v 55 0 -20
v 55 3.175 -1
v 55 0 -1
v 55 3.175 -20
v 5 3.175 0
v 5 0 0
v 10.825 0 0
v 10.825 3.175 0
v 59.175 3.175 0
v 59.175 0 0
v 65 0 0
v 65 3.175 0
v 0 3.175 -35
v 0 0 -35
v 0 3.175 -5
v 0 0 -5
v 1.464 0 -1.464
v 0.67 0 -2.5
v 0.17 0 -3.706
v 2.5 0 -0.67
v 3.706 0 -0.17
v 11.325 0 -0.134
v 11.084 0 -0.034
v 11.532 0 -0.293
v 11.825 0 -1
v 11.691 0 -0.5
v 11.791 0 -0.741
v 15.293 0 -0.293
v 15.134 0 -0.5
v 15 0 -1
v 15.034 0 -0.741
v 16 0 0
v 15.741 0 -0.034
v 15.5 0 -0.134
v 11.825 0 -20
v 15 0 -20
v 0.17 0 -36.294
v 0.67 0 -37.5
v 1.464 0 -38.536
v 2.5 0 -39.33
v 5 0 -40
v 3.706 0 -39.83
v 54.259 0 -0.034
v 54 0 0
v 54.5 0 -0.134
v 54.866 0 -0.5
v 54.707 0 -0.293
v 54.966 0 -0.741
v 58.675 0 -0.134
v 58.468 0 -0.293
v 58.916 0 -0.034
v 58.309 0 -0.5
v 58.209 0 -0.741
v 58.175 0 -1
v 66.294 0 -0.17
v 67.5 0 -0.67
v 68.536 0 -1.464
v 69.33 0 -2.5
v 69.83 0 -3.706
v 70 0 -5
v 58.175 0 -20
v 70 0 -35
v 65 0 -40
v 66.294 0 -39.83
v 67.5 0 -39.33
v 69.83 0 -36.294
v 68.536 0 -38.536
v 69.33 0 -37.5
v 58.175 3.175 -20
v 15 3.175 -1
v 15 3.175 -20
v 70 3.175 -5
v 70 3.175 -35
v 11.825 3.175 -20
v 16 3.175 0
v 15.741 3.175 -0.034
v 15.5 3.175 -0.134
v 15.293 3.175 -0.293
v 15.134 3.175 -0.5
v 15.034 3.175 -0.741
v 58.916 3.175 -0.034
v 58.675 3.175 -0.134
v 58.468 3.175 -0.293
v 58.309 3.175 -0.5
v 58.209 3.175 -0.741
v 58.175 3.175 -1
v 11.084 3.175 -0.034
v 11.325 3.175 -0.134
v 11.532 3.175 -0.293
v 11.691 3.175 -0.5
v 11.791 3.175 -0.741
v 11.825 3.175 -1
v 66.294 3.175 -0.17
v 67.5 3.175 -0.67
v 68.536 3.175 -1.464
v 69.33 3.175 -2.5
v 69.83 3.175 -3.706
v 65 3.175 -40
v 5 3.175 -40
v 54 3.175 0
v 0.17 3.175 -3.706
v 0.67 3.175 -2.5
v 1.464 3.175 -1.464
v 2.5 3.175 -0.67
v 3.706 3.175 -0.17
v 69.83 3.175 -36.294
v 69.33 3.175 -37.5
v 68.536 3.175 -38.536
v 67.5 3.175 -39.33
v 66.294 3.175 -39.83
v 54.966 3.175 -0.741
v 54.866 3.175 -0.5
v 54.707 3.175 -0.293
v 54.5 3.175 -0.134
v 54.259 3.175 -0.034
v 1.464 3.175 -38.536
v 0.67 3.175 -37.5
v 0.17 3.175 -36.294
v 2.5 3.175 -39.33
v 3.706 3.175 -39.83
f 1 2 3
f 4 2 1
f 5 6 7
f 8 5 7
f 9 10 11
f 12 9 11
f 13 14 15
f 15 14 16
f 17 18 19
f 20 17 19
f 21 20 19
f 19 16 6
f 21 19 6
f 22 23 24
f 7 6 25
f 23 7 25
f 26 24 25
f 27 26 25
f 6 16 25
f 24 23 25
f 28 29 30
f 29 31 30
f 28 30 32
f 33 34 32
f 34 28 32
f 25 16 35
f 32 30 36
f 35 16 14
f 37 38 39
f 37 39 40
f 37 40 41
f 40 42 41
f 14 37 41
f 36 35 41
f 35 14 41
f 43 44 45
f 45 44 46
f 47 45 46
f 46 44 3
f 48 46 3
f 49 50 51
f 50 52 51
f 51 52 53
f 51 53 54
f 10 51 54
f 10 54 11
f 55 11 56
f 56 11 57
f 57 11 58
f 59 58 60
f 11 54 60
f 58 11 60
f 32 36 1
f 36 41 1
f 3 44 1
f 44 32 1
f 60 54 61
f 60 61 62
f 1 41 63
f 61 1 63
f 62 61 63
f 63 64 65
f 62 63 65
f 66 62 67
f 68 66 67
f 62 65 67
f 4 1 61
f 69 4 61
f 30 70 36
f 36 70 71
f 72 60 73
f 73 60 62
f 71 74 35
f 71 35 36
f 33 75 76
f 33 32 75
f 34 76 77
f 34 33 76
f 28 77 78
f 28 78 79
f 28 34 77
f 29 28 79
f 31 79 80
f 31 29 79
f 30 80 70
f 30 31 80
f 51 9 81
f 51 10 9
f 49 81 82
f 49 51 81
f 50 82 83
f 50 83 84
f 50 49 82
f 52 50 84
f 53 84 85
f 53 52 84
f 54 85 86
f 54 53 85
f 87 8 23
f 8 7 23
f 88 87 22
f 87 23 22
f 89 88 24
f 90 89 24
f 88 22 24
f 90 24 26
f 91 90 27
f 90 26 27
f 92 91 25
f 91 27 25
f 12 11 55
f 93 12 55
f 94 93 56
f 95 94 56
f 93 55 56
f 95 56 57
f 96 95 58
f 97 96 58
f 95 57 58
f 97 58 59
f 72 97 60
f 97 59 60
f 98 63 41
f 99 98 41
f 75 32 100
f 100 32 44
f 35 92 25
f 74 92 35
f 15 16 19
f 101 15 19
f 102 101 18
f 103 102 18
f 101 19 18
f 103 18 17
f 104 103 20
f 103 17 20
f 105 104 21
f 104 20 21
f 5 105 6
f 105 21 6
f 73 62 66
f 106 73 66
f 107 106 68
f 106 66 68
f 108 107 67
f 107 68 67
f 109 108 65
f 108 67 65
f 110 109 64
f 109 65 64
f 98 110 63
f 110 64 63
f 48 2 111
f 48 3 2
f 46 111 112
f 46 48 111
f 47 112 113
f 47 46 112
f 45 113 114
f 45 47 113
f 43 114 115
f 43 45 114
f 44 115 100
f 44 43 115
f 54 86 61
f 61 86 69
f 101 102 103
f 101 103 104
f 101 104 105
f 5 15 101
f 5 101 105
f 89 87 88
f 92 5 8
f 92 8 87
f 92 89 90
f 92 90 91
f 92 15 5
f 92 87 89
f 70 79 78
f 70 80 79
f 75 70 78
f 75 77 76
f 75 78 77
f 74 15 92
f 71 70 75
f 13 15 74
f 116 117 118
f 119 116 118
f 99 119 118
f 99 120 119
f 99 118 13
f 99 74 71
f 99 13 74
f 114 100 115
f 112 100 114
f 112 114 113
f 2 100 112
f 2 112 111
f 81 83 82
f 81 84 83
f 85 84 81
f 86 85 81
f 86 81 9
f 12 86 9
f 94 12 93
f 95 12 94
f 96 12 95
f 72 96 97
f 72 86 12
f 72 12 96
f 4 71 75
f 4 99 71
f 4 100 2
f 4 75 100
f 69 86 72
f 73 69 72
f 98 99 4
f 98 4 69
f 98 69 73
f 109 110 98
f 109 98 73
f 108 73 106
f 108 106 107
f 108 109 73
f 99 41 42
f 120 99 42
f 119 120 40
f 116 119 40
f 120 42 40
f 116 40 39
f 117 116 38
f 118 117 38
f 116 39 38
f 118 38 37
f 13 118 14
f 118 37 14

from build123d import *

# Parameters (mm, degrees)
BOSS_EXTRUDE1_DEPTH = 3.175
SKETCH2_W           = 3.175
SKETCH2_H           = 20
CUT_EXTRUDE1_DEPTH  = 4.175
FILLET1_R           = 1


with BuildPart() as part:
    # Sketch1 → Boss-Extrude1 (new body)
    with BuildSketch(Plane(origin=(0, 0, 0), x_dir=(1, 0, 0), z_dir=(0, 1, 0))):
        with BuildLine():
            Line((5, 0), (65, 0))
            ThreePointArc((65, 0), (68.535533906, 1.464466094), (70, 5))
            Line((70, 5), (70, 35))
            ThreePointArc((70, 35), (68.535533906, 38.535533906), (65, 40))
            Line((65, 40), (5, 40))
            ThreePointArc((5, 40), (1.464466094, 38.535533906), (0, 35))
            Line((0, 35), (0, 5))
            ThreePointArc((0, 5), (1.464466094, 1.464466094), (5, 0))
        make_face()
    extrude(amount=BOSS_EXTRUDE1_DEPTH)

    # Sketch2 → Cut-Extrude1 (cut, through all)
    with BuildSketch(Plane(origin=(0, 3.175, 0), x_dir=(1, 0, 0), z_dir=(0, 1, 0))):
        with Locations((13.4125, 10)):
            Rectangle(SKETCH2_W, SKETCH2_H)
        with Locations((56.5875, 10)):
            Rectangle(SKETCH2_W, SKETCH2_H)
    extrude(amount=-CUT_EXTRUDE1_DEPTH, mode=Mode.SUBTRACT)

    # Fillet1
    fillet1_edges = [part.edges().sort_by_distance(p)[0] for p in [
        (15, 1.5875, 0),
        (58.175, 1.5875, 0),
        (55, 1.5875, 0),
        (11.825, 1.5875, 0),
    ]]
    fillet(fillet1_edges, radius=FILLET1_R)


solid = part.part
